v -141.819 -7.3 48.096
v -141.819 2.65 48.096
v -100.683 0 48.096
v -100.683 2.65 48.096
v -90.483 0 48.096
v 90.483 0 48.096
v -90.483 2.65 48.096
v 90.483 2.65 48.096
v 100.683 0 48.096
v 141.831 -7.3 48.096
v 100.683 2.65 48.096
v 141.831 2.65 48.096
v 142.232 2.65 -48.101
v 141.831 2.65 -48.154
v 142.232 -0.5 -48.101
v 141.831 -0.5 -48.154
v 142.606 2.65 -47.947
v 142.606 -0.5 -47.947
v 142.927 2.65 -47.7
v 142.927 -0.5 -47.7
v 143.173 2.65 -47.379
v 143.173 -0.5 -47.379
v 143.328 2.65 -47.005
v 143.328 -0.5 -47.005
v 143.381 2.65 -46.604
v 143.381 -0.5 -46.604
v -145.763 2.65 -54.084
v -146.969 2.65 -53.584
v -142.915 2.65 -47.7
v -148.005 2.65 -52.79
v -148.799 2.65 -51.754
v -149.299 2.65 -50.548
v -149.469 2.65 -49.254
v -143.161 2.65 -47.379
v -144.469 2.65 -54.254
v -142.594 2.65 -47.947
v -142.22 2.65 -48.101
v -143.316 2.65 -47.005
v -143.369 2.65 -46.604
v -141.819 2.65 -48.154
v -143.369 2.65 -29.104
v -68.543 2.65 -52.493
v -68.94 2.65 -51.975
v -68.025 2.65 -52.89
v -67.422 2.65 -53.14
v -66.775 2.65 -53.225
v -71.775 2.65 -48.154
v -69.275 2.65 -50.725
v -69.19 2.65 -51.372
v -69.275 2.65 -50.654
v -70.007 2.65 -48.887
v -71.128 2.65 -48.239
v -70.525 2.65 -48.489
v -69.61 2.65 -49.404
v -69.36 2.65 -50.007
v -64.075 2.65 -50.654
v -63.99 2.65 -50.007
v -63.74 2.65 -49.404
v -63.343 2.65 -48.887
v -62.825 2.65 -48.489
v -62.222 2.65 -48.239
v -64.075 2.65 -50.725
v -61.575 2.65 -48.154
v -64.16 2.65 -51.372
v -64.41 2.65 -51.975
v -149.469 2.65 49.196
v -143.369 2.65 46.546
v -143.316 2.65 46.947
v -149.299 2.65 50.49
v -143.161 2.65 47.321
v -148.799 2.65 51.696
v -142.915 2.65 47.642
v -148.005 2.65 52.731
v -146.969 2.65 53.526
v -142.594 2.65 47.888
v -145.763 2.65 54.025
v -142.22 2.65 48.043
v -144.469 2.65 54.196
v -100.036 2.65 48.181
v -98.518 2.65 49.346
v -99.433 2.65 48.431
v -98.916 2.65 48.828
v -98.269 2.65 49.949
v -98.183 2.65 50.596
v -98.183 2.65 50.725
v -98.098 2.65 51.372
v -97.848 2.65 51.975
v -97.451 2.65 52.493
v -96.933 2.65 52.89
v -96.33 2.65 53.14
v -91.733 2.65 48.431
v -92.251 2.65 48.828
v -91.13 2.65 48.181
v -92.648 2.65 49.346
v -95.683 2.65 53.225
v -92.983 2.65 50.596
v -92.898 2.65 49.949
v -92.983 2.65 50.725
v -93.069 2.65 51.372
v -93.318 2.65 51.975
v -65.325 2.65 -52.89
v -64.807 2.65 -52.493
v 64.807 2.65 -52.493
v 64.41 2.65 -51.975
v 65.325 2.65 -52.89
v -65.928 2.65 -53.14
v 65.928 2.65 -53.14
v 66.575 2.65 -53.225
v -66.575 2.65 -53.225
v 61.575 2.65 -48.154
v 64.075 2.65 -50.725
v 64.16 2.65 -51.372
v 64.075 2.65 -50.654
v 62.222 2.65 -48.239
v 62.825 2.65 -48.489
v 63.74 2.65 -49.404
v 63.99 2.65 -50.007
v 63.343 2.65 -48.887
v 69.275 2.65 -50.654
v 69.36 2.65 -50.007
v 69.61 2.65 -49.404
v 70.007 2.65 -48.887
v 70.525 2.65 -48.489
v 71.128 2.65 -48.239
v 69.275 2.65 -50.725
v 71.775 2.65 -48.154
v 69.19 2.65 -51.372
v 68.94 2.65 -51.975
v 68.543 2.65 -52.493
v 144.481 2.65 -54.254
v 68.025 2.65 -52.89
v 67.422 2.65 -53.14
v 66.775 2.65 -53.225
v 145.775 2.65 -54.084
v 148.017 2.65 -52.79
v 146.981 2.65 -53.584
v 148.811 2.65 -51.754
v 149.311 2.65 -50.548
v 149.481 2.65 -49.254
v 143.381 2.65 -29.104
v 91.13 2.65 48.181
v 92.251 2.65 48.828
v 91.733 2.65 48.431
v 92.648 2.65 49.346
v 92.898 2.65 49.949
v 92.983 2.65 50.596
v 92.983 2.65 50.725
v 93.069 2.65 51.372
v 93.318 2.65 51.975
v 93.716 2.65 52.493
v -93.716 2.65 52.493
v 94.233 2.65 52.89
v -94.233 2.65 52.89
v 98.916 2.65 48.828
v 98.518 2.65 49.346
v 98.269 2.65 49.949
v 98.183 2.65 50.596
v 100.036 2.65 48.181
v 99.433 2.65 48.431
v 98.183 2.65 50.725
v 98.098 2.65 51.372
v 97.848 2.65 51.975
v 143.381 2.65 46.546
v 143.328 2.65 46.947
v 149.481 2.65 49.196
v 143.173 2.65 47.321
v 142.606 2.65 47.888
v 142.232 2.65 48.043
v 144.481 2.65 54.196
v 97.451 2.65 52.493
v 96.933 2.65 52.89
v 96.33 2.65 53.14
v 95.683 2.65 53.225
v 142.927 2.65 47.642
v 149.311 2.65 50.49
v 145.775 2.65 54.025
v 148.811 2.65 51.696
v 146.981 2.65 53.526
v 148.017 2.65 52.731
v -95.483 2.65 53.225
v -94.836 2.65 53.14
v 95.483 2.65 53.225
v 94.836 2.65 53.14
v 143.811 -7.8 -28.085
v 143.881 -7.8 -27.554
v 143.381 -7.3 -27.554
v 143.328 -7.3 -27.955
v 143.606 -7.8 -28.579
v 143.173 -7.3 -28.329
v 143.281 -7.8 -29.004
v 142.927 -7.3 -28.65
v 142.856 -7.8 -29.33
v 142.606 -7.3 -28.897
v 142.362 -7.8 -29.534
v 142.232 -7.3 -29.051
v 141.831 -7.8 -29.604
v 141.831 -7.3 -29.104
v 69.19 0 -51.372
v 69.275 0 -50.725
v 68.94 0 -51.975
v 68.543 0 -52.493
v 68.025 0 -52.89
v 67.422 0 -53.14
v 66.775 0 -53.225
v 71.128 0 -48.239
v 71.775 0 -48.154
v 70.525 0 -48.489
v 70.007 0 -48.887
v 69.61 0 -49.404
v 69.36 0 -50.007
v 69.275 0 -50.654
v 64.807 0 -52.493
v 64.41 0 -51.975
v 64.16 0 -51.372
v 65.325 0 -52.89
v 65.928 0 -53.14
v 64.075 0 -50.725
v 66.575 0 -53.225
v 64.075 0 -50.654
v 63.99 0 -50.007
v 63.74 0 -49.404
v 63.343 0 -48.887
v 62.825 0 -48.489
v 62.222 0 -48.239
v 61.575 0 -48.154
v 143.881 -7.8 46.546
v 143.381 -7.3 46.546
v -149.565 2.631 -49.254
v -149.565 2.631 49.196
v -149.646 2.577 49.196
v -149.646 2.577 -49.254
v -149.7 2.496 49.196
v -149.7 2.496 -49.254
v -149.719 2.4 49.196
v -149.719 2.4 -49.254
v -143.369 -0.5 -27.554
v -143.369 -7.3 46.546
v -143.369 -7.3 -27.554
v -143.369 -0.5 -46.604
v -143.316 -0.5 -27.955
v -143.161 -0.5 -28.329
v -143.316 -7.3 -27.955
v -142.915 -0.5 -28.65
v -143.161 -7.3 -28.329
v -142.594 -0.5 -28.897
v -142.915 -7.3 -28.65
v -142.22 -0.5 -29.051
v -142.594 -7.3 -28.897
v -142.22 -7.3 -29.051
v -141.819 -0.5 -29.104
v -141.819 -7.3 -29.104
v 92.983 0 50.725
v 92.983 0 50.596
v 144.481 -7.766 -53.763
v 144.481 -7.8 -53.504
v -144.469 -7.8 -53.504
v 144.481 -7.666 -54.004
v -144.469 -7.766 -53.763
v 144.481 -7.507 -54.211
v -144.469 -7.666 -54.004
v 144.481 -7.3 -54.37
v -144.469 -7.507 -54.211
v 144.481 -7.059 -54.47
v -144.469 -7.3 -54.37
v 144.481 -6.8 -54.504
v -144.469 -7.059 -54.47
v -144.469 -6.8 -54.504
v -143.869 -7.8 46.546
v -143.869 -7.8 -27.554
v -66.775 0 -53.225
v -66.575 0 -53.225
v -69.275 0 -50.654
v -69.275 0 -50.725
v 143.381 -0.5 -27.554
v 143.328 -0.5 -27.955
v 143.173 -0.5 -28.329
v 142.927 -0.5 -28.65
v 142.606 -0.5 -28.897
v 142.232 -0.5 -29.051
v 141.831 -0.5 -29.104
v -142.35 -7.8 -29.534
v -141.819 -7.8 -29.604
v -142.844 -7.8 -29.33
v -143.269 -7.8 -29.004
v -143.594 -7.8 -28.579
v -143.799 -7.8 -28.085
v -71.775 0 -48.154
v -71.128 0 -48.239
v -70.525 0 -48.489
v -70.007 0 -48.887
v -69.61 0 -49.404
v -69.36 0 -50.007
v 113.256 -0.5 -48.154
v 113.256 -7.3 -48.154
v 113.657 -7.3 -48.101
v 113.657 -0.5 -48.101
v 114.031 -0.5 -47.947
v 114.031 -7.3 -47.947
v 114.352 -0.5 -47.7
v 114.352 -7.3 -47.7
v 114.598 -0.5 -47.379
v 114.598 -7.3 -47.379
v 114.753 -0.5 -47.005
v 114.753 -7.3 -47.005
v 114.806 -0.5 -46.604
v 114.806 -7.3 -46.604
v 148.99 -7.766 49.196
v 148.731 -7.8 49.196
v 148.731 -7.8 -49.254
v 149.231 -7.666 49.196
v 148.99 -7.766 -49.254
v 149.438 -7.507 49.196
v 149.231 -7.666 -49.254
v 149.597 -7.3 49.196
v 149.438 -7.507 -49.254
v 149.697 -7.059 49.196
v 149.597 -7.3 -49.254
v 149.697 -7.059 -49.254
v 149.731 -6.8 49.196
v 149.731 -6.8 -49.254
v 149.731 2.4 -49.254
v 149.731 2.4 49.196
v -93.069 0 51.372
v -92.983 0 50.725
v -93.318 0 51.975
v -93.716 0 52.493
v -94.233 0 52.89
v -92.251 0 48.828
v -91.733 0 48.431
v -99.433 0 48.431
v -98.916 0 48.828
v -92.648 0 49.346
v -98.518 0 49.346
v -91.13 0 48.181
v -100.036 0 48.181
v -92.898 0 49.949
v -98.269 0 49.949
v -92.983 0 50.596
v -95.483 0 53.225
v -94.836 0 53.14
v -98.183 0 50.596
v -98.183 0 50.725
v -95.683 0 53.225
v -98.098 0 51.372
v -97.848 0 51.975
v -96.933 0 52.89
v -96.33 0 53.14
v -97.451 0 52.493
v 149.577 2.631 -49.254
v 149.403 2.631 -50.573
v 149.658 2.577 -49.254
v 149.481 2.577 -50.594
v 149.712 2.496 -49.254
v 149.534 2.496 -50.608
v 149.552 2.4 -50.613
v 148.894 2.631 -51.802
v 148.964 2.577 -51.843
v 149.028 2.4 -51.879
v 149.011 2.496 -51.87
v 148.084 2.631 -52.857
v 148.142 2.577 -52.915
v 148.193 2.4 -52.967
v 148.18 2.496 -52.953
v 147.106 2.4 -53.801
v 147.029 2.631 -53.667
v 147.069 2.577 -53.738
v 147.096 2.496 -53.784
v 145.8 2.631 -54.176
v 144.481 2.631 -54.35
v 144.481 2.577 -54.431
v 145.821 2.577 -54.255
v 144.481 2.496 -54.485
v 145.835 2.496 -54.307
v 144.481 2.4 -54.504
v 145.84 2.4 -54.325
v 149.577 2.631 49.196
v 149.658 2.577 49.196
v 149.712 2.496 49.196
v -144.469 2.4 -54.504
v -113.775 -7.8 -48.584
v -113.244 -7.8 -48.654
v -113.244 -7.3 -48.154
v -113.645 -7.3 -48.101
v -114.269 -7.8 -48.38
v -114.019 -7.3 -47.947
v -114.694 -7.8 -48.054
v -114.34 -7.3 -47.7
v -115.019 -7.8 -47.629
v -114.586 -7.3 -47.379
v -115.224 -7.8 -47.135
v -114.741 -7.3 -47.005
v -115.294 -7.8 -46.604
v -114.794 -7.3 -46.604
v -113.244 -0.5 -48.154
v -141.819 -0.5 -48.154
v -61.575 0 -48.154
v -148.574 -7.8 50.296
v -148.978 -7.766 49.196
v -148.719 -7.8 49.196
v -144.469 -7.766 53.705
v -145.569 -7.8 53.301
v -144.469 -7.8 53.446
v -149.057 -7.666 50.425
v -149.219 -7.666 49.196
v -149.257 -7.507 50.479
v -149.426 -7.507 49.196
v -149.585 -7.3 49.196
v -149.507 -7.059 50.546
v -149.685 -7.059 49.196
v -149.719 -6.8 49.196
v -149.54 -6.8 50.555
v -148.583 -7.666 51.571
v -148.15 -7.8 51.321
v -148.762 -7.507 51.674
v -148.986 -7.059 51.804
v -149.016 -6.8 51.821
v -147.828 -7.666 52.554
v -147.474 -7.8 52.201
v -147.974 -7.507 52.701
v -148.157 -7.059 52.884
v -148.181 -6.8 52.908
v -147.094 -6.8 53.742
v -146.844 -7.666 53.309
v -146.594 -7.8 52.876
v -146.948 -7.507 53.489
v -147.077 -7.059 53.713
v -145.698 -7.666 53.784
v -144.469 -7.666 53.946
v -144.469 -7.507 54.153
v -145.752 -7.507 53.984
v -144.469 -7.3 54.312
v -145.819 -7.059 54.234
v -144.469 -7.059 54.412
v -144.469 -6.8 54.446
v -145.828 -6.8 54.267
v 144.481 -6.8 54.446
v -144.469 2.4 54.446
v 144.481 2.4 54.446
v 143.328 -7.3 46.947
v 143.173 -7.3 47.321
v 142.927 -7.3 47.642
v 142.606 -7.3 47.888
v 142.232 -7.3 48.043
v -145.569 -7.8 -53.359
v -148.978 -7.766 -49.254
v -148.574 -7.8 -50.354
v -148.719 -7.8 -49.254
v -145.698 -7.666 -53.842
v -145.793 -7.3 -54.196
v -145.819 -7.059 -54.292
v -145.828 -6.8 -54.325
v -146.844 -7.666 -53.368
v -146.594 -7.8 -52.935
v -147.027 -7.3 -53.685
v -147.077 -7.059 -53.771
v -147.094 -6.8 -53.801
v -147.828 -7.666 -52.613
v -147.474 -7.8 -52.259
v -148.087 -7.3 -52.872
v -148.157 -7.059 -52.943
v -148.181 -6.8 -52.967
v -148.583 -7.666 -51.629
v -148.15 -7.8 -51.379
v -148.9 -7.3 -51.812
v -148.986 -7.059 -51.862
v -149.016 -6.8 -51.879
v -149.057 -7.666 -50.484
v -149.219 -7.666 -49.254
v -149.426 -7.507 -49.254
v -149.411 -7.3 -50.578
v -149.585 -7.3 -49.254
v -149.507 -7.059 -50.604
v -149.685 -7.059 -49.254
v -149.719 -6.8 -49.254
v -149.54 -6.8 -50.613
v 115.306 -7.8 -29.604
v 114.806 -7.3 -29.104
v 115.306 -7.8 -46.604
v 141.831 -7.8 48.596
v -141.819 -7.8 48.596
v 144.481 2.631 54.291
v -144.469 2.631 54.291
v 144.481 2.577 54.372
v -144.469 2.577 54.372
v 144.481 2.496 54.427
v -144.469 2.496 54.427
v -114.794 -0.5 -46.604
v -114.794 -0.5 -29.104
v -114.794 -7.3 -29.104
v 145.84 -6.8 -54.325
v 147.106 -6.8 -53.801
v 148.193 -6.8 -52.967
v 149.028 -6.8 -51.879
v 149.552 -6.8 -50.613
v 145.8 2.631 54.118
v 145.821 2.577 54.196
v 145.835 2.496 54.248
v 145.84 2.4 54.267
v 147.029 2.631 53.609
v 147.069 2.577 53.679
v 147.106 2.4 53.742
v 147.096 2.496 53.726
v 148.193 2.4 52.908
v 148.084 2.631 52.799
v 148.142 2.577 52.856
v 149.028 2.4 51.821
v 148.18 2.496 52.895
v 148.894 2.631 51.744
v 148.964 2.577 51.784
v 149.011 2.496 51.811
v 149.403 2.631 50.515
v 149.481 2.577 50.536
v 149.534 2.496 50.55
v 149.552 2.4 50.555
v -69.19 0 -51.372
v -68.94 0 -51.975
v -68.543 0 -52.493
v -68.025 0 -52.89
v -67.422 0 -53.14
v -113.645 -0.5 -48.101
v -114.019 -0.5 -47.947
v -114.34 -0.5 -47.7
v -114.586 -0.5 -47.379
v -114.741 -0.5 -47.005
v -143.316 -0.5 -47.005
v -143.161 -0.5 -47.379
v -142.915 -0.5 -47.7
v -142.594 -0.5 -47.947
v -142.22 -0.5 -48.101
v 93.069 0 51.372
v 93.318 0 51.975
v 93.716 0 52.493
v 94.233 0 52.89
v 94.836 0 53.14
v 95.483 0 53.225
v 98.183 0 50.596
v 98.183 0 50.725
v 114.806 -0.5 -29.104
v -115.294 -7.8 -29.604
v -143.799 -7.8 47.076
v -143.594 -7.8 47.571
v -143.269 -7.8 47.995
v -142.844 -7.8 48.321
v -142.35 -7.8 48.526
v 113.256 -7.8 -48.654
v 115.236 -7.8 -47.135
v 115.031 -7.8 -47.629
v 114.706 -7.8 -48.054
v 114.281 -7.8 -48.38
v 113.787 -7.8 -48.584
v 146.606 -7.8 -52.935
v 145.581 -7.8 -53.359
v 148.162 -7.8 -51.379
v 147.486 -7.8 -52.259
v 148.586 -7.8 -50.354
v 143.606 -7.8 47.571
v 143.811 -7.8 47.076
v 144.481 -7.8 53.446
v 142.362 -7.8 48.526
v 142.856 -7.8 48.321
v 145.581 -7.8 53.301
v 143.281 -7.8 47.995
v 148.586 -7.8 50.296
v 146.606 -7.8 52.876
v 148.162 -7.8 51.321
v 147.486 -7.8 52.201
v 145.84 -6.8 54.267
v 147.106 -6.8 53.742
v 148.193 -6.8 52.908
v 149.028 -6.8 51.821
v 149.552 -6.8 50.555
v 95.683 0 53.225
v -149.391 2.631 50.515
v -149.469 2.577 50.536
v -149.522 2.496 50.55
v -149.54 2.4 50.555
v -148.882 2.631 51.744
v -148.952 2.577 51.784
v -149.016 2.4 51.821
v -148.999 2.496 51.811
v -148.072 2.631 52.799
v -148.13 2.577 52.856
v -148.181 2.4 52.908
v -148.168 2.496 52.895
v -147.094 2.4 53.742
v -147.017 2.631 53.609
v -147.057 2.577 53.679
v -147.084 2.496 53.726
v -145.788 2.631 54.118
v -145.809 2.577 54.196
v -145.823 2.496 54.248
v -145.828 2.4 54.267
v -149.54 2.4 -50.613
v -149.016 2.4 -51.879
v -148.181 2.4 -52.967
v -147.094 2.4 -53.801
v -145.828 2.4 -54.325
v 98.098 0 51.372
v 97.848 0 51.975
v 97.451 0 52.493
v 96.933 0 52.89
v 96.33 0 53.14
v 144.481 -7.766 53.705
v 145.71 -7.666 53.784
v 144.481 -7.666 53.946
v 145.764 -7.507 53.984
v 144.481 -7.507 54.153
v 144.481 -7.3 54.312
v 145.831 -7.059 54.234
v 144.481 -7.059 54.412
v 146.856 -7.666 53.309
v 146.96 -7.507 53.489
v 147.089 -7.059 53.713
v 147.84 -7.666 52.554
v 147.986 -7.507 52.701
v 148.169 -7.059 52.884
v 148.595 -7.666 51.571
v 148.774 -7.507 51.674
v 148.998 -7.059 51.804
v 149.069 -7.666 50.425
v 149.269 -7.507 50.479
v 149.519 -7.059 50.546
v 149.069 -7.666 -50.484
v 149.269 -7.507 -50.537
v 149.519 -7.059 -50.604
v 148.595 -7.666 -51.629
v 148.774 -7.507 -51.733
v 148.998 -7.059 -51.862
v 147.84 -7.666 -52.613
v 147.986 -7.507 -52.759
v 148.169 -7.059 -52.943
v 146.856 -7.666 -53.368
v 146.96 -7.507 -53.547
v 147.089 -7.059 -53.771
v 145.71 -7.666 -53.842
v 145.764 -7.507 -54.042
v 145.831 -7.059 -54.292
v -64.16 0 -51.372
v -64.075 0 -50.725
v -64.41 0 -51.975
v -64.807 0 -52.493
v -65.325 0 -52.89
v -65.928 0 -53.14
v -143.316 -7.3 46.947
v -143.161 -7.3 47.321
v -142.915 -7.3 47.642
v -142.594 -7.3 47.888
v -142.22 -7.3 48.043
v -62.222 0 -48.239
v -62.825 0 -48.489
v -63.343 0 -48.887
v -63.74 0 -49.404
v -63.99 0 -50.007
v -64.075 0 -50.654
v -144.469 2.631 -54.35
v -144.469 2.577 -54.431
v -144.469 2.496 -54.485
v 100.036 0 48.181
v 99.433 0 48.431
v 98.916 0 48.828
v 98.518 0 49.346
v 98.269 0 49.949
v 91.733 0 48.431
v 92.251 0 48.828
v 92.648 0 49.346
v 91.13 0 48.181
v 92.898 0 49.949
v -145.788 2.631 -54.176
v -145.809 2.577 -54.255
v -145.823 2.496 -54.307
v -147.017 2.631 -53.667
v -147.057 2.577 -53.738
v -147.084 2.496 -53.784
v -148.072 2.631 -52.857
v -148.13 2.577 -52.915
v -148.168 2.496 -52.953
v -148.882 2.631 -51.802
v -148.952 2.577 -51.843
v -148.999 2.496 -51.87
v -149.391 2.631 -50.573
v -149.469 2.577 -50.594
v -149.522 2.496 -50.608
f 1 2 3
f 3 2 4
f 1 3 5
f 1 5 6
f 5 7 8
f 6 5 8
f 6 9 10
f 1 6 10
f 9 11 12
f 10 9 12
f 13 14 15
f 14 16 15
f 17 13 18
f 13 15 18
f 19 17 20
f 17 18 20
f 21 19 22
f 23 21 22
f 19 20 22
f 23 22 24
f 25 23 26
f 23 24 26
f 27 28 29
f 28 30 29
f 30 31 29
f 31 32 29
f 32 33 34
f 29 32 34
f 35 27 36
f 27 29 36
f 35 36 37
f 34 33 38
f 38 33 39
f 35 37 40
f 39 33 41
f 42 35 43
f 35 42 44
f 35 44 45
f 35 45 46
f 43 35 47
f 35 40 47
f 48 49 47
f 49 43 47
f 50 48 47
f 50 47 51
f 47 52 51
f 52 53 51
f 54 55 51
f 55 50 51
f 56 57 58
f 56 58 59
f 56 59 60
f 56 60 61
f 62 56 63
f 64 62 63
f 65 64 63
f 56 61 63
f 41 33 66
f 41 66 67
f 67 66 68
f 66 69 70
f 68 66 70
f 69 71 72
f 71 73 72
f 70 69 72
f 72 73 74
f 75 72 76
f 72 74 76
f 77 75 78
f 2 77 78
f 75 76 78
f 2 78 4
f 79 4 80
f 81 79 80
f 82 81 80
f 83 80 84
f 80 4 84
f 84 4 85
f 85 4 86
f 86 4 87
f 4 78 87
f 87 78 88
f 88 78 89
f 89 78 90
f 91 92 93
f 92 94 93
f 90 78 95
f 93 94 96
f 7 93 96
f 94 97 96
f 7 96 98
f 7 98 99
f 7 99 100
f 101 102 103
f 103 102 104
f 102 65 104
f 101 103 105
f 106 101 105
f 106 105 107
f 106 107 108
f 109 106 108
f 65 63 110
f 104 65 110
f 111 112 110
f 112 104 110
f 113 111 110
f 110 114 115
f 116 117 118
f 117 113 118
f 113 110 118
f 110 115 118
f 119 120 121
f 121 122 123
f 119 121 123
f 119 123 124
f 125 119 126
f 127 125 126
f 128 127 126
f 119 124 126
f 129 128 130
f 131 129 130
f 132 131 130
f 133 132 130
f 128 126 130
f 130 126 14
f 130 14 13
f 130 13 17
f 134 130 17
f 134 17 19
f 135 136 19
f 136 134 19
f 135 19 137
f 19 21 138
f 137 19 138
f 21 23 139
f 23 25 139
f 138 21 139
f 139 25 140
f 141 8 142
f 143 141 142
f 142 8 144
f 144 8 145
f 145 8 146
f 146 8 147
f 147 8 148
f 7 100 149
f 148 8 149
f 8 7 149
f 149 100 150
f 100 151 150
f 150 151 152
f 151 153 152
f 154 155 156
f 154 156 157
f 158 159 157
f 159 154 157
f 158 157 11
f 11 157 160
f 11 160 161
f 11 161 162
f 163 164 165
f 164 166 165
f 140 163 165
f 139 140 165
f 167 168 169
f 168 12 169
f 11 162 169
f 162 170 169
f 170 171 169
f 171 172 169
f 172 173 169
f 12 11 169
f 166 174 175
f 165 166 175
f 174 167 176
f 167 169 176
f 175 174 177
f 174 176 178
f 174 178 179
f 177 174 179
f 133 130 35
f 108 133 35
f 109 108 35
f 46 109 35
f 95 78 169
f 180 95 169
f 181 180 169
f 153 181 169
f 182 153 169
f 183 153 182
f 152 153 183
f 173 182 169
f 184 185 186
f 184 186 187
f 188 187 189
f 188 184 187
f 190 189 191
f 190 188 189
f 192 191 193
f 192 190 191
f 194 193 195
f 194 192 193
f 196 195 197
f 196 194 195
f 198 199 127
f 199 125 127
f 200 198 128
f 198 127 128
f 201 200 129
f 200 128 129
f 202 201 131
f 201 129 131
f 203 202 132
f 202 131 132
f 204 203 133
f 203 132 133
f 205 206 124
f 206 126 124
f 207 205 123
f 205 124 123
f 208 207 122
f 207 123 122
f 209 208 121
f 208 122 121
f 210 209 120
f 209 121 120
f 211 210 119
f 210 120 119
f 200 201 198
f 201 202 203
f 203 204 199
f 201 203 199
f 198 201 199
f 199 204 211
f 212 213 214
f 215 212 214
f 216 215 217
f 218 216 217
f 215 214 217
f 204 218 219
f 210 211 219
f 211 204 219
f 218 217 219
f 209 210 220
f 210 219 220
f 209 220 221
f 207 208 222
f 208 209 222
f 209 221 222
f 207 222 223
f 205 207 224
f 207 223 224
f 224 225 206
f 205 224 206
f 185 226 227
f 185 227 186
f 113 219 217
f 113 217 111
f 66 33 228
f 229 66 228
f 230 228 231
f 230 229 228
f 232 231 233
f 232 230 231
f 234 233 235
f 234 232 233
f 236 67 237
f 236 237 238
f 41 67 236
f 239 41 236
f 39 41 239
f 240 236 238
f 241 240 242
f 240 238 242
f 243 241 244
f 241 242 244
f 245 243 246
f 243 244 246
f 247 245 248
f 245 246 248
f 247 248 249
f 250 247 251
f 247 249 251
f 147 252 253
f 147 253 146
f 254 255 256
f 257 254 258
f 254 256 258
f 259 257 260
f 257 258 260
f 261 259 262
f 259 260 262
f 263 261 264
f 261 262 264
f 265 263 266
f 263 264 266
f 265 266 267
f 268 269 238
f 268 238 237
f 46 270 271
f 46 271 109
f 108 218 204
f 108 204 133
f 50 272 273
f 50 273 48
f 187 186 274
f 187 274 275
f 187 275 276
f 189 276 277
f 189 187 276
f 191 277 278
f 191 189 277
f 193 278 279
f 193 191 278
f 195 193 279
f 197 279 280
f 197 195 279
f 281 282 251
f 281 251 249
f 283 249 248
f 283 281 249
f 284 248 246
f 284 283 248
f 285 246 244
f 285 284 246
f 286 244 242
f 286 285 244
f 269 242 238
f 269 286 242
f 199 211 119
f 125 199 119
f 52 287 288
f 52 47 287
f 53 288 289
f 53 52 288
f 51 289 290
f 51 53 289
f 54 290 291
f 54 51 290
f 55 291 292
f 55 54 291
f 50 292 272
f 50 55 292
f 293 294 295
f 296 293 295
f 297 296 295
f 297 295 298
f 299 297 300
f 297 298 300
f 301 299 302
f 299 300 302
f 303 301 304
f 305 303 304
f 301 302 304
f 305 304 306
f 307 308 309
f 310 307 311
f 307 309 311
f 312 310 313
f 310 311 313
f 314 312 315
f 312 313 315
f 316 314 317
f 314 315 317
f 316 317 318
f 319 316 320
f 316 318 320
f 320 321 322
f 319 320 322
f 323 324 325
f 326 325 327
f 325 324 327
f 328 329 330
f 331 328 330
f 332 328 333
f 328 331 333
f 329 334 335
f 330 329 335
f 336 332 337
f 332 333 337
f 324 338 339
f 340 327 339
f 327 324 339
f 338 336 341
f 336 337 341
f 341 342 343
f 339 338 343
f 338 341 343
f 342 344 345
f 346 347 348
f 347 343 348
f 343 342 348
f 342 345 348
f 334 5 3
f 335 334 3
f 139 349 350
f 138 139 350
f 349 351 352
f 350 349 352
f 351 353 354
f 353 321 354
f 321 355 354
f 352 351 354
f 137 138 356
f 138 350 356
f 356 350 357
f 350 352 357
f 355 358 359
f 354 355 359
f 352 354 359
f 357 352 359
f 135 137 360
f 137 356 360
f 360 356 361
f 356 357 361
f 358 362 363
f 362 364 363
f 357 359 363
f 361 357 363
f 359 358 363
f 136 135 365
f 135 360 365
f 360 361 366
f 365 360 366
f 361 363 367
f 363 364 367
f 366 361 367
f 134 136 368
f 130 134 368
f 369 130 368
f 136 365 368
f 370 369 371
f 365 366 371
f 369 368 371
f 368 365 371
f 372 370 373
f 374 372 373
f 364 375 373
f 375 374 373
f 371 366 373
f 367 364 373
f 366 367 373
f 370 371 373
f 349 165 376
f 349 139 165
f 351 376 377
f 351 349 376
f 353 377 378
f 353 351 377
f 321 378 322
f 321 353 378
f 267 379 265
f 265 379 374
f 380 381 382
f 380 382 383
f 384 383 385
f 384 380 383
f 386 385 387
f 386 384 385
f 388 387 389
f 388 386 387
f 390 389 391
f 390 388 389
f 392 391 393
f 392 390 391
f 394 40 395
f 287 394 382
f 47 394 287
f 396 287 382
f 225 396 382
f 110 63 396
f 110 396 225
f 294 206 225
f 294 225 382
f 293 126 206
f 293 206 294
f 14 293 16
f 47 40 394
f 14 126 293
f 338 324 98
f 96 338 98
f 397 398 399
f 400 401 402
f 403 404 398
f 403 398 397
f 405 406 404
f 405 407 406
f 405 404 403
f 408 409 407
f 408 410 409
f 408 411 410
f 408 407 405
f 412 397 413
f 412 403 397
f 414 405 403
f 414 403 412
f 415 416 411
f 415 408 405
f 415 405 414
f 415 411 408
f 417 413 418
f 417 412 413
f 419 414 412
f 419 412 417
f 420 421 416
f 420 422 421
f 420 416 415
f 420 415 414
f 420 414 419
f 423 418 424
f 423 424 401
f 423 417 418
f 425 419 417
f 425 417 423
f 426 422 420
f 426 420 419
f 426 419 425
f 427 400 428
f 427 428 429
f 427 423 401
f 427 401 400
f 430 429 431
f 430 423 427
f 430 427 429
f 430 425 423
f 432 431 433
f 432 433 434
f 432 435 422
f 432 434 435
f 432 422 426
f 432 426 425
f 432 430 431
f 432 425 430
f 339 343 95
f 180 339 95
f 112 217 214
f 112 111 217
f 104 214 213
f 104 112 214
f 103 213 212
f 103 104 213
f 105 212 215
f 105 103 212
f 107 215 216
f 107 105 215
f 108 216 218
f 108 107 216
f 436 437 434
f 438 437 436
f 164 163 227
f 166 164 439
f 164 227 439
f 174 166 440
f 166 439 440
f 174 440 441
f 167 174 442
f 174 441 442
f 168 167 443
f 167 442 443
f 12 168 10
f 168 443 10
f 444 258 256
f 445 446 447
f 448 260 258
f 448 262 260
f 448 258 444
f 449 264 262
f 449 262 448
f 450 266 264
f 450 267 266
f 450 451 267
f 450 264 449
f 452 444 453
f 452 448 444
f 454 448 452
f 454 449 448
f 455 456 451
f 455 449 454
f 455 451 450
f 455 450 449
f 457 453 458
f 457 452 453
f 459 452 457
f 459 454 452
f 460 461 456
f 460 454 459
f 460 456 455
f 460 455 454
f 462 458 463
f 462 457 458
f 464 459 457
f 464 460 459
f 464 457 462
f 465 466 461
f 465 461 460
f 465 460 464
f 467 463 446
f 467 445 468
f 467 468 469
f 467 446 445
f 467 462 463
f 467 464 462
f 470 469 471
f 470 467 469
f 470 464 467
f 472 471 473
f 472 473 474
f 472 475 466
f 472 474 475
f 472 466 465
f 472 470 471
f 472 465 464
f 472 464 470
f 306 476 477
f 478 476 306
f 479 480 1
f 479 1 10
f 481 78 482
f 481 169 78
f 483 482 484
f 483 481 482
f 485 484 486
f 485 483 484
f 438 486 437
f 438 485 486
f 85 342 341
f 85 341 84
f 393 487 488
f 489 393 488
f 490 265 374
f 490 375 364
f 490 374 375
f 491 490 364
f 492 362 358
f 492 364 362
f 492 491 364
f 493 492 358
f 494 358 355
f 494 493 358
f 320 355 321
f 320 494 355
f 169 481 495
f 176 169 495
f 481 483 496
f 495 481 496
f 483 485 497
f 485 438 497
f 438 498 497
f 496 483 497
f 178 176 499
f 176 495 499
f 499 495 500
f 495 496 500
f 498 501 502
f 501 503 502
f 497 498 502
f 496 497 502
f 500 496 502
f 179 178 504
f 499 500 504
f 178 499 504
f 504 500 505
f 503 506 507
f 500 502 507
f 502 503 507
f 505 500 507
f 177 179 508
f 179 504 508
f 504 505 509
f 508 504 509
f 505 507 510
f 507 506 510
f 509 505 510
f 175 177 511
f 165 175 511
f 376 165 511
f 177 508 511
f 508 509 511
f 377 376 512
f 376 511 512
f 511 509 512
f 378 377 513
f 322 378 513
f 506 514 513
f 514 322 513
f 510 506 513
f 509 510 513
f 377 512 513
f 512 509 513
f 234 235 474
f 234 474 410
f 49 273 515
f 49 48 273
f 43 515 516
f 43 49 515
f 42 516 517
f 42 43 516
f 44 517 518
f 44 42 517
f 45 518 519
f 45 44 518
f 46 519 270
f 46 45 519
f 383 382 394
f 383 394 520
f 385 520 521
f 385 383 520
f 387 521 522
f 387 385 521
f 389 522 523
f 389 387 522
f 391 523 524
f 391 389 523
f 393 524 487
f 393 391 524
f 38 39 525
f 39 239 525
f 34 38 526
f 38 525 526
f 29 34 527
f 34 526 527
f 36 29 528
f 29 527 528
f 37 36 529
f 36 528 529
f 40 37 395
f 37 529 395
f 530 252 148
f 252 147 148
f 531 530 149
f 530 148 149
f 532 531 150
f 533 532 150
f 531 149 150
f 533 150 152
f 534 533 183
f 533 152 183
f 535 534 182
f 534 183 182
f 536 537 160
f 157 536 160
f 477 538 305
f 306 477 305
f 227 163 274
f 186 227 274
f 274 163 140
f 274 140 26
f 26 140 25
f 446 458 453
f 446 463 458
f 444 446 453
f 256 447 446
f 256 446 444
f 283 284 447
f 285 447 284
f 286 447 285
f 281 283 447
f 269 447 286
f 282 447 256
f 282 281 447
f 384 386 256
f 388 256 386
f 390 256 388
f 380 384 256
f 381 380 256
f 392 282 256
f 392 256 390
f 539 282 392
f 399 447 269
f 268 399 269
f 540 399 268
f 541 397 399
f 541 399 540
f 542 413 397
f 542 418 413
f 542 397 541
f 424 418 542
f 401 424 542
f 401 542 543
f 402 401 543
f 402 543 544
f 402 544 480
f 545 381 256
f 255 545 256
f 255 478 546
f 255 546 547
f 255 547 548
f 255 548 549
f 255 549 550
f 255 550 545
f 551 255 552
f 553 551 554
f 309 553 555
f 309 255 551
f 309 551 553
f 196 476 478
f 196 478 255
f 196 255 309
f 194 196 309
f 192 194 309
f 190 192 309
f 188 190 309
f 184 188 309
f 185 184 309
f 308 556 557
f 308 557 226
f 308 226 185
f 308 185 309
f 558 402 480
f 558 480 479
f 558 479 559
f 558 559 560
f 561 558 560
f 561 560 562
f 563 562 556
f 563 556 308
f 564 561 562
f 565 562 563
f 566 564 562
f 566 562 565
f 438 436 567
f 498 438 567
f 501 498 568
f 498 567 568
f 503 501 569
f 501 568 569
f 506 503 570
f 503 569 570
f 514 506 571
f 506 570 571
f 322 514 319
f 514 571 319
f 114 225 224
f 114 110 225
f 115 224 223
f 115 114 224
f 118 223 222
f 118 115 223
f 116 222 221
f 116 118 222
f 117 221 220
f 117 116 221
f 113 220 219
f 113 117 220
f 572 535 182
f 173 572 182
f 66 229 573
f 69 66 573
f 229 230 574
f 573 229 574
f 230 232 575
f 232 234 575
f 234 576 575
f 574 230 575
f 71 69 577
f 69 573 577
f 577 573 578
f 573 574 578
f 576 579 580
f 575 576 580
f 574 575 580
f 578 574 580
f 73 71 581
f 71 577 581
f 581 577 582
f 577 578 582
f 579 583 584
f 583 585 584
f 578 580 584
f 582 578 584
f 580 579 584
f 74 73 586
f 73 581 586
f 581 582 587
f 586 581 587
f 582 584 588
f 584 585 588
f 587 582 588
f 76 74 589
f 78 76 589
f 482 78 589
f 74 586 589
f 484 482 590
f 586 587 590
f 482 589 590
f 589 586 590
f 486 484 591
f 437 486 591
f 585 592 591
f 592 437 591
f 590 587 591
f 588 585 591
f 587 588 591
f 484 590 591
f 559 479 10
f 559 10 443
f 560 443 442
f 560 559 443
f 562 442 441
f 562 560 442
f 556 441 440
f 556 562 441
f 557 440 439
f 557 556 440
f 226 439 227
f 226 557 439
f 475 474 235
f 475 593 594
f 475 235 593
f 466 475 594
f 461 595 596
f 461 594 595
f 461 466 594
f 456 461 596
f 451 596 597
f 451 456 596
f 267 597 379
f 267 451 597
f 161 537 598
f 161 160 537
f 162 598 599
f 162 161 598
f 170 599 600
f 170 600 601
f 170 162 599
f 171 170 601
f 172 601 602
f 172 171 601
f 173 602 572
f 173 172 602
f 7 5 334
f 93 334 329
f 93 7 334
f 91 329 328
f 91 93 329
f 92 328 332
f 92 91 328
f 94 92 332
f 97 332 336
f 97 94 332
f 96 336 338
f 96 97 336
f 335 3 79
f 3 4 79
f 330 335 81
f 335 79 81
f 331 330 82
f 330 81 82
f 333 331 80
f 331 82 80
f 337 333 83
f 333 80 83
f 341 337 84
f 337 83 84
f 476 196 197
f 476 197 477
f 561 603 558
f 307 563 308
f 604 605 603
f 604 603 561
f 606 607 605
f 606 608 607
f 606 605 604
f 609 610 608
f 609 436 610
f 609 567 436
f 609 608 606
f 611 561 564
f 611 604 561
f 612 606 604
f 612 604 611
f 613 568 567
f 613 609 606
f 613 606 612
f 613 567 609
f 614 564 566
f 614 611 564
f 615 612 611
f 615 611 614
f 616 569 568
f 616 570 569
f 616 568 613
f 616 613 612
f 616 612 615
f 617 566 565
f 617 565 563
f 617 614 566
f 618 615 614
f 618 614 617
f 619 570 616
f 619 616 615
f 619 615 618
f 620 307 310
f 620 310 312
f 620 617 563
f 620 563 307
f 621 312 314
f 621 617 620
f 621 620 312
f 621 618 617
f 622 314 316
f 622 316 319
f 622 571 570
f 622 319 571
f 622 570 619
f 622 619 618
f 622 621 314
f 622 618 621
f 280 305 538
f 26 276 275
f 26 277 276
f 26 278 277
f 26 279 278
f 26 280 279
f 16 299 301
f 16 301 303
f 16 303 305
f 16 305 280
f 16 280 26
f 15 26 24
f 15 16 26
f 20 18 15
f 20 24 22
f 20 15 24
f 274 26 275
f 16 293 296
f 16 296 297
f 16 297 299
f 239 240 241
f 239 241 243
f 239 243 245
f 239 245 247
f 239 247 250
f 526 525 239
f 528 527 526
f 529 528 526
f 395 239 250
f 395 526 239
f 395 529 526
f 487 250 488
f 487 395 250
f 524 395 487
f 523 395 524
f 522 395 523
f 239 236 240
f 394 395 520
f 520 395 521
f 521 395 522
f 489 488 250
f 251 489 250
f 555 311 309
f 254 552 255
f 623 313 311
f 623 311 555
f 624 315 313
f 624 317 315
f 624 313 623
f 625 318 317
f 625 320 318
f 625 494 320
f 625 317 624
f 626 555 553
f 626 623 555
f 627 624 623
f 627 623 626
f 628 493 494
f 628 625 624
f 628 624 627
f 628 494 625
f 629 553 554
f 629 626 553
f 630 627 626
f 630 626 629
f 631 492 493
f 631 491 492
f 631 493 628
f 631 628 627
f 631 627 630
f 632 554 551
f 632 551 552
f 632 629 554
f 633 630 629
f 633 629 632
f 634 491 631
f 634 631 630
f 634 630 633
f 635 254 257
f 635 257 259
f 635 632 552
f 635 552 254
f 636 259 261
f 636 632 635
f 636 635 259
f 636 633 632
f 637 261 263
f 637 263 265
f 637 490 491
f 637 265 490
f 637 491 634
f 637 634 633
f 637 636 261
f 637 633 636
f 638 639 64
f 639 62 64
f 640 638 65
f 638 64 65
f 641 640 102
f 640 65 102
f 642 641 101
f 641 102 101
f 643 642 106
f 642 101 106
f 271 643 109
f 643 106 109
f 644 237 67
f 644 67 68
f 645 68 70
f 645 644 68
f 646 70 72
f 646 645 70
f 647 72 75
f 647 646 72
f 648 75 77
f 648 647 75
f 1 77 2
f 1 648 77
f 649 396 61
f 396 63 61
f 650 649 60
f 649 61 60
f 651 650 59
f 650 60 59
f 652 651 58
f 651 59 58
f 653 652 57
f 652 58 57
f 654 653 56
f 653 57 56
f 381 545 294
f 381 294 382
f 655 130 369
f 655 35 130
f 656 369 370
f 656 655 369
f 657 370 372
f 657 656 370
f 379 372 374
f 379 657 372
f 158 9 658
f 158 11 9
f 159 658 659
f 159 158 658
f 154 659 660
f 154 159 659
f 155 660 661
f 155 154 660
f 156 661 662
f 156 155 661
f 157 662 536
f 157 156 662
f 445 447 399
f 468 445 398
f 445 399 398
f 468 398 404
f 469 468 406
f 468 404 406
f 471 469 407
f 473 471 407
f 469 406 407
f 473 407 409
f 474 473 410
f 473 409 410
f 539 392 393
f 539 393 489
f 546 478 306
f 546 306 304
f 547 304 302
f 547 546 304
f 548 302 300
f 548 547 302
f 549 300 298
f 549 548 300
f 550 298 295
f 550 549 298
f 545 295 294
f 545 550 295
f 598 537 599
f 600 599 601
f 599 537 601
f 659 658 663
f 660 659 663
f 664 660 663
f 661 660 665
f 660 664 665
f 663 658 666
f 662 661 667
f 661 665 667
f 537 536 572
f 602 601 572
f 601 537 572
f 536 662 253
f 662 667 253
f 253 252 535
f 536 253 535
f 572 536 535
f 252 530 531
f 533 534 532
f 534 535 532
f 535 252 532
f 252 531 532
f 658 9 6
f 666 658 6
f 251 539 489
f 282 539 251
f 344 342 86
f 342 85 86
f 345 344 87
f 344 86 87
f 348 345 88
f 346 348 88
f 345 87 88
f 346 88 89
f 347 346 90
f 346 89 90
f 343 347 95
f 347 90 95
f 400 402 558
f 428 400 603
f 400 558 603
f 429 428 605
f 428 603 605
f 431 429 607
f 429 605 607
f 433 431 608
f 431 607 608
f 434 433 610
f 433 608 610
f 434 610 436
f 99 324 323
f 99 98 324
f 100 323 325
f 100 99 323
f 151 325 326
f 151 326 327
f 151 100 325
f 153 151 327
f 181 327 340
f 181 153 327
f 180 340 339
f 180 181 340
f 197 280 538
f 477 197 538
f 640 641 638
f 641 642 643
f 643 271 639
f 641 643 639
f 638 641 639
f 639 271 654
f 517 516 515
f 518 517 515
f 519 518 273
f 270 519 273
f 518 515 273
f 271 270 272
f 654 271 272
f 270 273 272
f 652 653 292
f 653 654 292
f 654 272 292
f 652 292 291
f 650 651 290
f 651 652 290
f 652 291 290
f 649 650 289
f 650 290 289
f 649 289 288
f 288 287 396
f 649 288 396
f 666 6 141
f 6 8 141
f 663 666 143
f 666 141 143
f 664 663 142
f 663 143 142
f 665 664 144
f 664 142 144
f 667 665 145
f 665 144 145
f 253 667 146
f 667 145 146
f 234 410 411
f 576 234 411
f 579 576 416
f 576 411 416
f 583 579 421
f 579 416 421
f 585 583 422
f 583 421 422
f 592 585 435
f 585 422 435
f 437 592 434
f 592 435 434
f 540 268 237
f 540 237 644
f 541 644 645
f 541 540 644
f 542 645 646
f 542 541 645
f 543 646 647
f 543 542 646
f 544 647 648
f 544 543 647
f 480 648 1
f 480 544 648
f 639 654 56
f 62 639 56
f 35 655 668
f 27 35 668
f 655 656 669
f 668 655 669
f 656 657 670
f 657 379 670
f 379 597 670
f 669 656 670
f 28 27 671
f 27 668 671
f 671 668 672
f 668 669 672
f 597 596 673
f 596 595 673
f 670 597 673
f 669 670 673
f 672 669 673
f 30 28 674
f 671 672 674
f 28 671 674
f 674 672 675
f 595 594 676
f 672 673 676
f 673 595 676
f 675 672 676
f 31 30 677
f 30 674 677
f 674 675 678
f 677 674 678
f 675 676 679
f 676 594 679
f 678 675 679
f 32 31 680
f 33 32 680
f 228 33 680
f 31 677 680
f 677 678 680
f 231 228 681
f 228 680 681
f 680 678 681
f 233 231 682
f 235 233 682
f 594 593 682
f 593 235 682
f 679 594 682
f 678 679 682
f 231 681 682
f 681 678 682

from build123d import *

# Parameters (mm, degrees)
BOSS_EXTRUDE1_DEPTH      = 7.8
BOSS_EXTRUDE1_DEPTH_BACK = 2.65
SKETCH1_W                = 299.45
SKETCH1_H                = 108.950000082
CUT_EXTRUDE1_START       = 2.65
SKETCH3_W                = 28.574999543
SKETCH3_H                = 19.050000082
SKETCH3_W_2              = 28.575000457
CUT_EXTRUDE1_DEPTH       = 3.15
CUT_EXTRUDE2_START       = -98.183332877
CUT_EXTRUDE2_OUTLINE_W   = 2.65
CUT_EXTRUDE2_OUTLINE_H   = 5.129290046
CUT_EXTRUDE2_DEPTH       = 5.2
CUT_EXTRUDE2_START_2     = 92.983332877
CUT_EXTRUDE2_2_OUTLINE_W = 2.65
CUT_EXTRUDE2_2_OUTLINE_H = 5.129290046
CUT_EXTRUDE2_2_DEPTH     = 5.2
CUT_EXTRUDE2_START_3     = -69.275
CUT_EXTRUDE2_3_OUTLINE_W = 2.65
CUT_EXTRUDE2_3_OUTLINE_H = 5.070709954
CUT_EXTRUDE2_3_DEPTH     = 5.2
CUT_EXTRUDE2_START_4     = 64.075
CUT_EXTRUDE2_4_OUTLINE_W = 2.65
CUT_EXTRUDE2_4_OUTLINE_H = 5.070709954
CUT_EXTRUDE2_4_DEPTH     = 5.2
FILLET1_R                = 5.25
FILLET2_R                = 1.55
FILLET3_R                = 0.25
CHAMFER1_SIZE            = 0.5
FILLET4_R                = 1
FILLET7_R                = 2.5


# Read off the part's stored shape, not the designer's step: Cut-Extrude2
with BuildPart() as part:
    # Sketch1 → Boss-Extrude1 (new, two sides: drawn at the far end of the back side and taken through both)
    with BuildSketch(Plane.XZ.offset(-BOSS_EXTRUDE1_DEPTH_BACK)):
        with Locations((0.005996207, -0.029290046)):
            Rectangle(SKETCH1_W, SKETCH1_H)
        Polygon((-143.369003793, 48.095709995), (143.380996207, 48.095709995), (143.380996207, -29.104290005), (114.80599575, -29.104290005), (114.80599575, -48.154290087), (-114.79400425, -48.154290087), (-114.79400425, -29.104290005), (-143.369003793, -29.104290005), align=None, mode=Mode.SUBTRACT)
    extrude(amount=BOSS_EXTRUDE1_DEPTH + BOSS_EXTRUDE1_DEPTH_BACK)

    # Sketch3 → Cut-Extrude1 (cut)
    with BuildSketch(Plane(origin=(0, 0, 0), x_dir=(1, 0, 0), z_dir=(0, 1, 0)).offset(CUT_EXTRUDE1_START)):
        with Locations((-129.081504021, 38.629290046)):
            Rectangle(SKETCH3_W, SKETCH3_H)
        with Locations((129.093495979, 38.629290046)):
            Rectangle(SKETCH3_W_2, SKETCH3_H)
    extrude(amount=-CUT_EXTRUDE1_DEPTH, mode=Mode.SUBTRACT)

    # Cut-Extrude2 outline → Cut-Extrude2 (cut)
    with BuildSketch(Plane.YZ.offset(CUT_EXTRUDE2_START)):
        with Locations((1.325, 50.660355018)):
            Rectangle(CUT_EXTRUDE2_OUTLINE_W, CUT_EXTRUDE2_OUTLINE_H)
    extrude(amount=CUT_EXTRUDE2_DEPTH, mode=Mode.SUBTRACT)

    # Cut-Extrude2 2 outline → Cut-Extrude2 2 (cut)
    with BuildSketch(Plane.YZ.offset(CUT_EXTRUDE2_START_2)):
        with Locations((1.325, 50.660355018)):
            Rectangle(CUT_EXTRUDE2_2_OUTLINE_W, CUT_EXTRUDE2_2_OUTLINE_H)
    extrude(amount=CUT_EXTRUDE2_2_DEPTH, mode=Mode.SUBTRACT)

    # Cut-Extrude2 3 outline → Cut-Extrude2 3 (cut)
    with BuildSketch(Plane.YZ.offset(CUT_EXTRUDE2_START_3)):
        with Locations((1.325, -50.689645064)):
            Rectangle(CUT_EXTRUDE2_3_OUTLINE_W, CUT_EXTRUDE2_3_OUTLINE_H)
    extrude(amount=CUT_EXTRUDE2_3_DEPTH, mode=Mode.SUBTRACT)

    # Cut-Extrude2 4 outline → Cut-Extrude2 4 (cut)
    with BuildSketch(Plane.YZ.offset(CUT_EXTRUDE2_START_4)):
        with Locations((1.325, -50.689645064)):
            Rectangle(CUT_EXTRUDE2_4_OUTLINE_W, CUT_EXTRUDE2_4_OUTLINE_H)
    extrude(amount=CUT_EXTRUDE2_4_DEPTH, mode=Mode.SUBTRACT)

    # Fillet1
    fillet1_edges = [part.edges().sort_by_distance(p)[0] for p in [
        (-149.719003793, -2.575, 54.445709995),
        (149.730996207, -2.575, 54.445709995),
        (149.730996207, -2.575, -54.504290087),
        (-149.719003793, -2.575, -54.504290087),
    ]]
    fillet(fillet1_edges, radius=FILLET1_R)

    # Fillet2
    fillet2_edges = [part.edges().sort_by_distance(p)[0] for p in [
        (-143.369003793, -2.575, 48.095709995),
        (143.380996207, -2.575, 48.095709995),
        (-143.369003793, -4.15, -29.104290005),
        (-114.79400425, -4.15, -48.154290087),
        (114.80599575, -4.15, -48.154290087),
        (143.380996207, -4.15, -29.104290005),
        (-143.369003793, 1.075, -48.154290087),
        (143.380996207, 1.075, -48.154290087),
    ]]
    fillet(fillet2_edges, radius=FILLET2_R)

    # Fillet3
    fillet3_edges = [part.edges().sort_by_distance(p)[0] for p in [
        (-149.719003793, 2.65, -0.029290046),
        (0.005996207, 2.65, -54.504290087),
        (0.005996207, 2.65, 54.445709995),
        (149.730996207, 2.65, -0.029290046),
        (-148.181314394, 2.65, 52.908020596),
        (148.193306808, 2.65, 52.908020596),
        (148.193306808, 2.65, -52.966600688),
        (-148.181314394, 2.65, -52.966600688),
    ]]
    fillet(fillet3_edges, radius=FILLET3_R)

    # Chamfer1
    chamfer1_edges = [part.edges().sort_by_distance(p)[0] for p in [
        (0.00599575, -7.8, -48.154290087),
        (143.380996207, -7.8, 9.495709995),
        (-143.369003793, -7.8, 9.495709995),
        (114.80599575, -7.8, -37.854290046),
        (0.005996207, -7.8, 48.095709995),
        (-128.306504021, -7.8, -29.104290005),
        (114.352011261, -7.8, -47.700305598),
        (142.927011718, -7.8, -28.650305516),
        (142.927011718, -7.8, 47.641725506),
        (-114.34001976, -7.8, -47.700305598),
        (-142.915019304, -7.8, -28.650305516),
        (-142.915019304, -7.8, 47.641725506),
        (-114.79400425, -7.8, -37.854290046),
        (128.318495979, -7.8, -29.104290005),
    ]]
    chamfer(chamfer1_edges, length=CHAMFER1_SIZE)

    # Fillet4
    fillet4_edges = [part.edges().sort_by_distance(p)[0] for p in [
        (-149.719003793, -7.8, -0.029290046),
        (0.005996207, -7.8, -54.504290087),
        (149.730996207, -7.8, -0.029290046),
        (0.005996207, -7.8, 54.445709995),
        (-148.181314394, -7.8, 52.908020596),
        (148.193306808, -7.8, 52.908020596),
        (148.193306808, -7.8, -52.966600688),
        (-148.181314394, -7.8, -52.966600688),
    ]]
    fillet(fillet4_edges, radius=FILLET4_R)

    # Fillet7
    fillet7_edges = [part.edges().sort_by_distance(p)[0] for p in [
        (-98.183332877, 1.325, 53.225000041),
        (-92.983332877, 1.325, 53.225000041),
        (92.983332877, 1.325, 53.225000041),
        (98.183332877, 1.325, 53.225000041),
        (69.275, 1.325, -53.225000041),
        (64.075, 1.325, -53.225000041),
        (-64.075, 1.325, -53.225000041),
        (-69.275, 1.325, -53.225000041),
        (-69.275, 1.325, -48.154290087),
        (-64.075, 1.325, -48.154290087),
        (69.275, 1.325, -48.154290087),
        (64.075, 1.325, -48.154290087),
        (92.983332877, 1.325, 48.095709995),
        (98.183332877, 1.325, 48.095709995),
        (-98.183332877, 1.325, 48.095709995),
        (-92.983332877, 1.325, 48.095709995),
    ]]
    fillet(fillet7_edges, radius=FILLET7_R)


solid = part.part
